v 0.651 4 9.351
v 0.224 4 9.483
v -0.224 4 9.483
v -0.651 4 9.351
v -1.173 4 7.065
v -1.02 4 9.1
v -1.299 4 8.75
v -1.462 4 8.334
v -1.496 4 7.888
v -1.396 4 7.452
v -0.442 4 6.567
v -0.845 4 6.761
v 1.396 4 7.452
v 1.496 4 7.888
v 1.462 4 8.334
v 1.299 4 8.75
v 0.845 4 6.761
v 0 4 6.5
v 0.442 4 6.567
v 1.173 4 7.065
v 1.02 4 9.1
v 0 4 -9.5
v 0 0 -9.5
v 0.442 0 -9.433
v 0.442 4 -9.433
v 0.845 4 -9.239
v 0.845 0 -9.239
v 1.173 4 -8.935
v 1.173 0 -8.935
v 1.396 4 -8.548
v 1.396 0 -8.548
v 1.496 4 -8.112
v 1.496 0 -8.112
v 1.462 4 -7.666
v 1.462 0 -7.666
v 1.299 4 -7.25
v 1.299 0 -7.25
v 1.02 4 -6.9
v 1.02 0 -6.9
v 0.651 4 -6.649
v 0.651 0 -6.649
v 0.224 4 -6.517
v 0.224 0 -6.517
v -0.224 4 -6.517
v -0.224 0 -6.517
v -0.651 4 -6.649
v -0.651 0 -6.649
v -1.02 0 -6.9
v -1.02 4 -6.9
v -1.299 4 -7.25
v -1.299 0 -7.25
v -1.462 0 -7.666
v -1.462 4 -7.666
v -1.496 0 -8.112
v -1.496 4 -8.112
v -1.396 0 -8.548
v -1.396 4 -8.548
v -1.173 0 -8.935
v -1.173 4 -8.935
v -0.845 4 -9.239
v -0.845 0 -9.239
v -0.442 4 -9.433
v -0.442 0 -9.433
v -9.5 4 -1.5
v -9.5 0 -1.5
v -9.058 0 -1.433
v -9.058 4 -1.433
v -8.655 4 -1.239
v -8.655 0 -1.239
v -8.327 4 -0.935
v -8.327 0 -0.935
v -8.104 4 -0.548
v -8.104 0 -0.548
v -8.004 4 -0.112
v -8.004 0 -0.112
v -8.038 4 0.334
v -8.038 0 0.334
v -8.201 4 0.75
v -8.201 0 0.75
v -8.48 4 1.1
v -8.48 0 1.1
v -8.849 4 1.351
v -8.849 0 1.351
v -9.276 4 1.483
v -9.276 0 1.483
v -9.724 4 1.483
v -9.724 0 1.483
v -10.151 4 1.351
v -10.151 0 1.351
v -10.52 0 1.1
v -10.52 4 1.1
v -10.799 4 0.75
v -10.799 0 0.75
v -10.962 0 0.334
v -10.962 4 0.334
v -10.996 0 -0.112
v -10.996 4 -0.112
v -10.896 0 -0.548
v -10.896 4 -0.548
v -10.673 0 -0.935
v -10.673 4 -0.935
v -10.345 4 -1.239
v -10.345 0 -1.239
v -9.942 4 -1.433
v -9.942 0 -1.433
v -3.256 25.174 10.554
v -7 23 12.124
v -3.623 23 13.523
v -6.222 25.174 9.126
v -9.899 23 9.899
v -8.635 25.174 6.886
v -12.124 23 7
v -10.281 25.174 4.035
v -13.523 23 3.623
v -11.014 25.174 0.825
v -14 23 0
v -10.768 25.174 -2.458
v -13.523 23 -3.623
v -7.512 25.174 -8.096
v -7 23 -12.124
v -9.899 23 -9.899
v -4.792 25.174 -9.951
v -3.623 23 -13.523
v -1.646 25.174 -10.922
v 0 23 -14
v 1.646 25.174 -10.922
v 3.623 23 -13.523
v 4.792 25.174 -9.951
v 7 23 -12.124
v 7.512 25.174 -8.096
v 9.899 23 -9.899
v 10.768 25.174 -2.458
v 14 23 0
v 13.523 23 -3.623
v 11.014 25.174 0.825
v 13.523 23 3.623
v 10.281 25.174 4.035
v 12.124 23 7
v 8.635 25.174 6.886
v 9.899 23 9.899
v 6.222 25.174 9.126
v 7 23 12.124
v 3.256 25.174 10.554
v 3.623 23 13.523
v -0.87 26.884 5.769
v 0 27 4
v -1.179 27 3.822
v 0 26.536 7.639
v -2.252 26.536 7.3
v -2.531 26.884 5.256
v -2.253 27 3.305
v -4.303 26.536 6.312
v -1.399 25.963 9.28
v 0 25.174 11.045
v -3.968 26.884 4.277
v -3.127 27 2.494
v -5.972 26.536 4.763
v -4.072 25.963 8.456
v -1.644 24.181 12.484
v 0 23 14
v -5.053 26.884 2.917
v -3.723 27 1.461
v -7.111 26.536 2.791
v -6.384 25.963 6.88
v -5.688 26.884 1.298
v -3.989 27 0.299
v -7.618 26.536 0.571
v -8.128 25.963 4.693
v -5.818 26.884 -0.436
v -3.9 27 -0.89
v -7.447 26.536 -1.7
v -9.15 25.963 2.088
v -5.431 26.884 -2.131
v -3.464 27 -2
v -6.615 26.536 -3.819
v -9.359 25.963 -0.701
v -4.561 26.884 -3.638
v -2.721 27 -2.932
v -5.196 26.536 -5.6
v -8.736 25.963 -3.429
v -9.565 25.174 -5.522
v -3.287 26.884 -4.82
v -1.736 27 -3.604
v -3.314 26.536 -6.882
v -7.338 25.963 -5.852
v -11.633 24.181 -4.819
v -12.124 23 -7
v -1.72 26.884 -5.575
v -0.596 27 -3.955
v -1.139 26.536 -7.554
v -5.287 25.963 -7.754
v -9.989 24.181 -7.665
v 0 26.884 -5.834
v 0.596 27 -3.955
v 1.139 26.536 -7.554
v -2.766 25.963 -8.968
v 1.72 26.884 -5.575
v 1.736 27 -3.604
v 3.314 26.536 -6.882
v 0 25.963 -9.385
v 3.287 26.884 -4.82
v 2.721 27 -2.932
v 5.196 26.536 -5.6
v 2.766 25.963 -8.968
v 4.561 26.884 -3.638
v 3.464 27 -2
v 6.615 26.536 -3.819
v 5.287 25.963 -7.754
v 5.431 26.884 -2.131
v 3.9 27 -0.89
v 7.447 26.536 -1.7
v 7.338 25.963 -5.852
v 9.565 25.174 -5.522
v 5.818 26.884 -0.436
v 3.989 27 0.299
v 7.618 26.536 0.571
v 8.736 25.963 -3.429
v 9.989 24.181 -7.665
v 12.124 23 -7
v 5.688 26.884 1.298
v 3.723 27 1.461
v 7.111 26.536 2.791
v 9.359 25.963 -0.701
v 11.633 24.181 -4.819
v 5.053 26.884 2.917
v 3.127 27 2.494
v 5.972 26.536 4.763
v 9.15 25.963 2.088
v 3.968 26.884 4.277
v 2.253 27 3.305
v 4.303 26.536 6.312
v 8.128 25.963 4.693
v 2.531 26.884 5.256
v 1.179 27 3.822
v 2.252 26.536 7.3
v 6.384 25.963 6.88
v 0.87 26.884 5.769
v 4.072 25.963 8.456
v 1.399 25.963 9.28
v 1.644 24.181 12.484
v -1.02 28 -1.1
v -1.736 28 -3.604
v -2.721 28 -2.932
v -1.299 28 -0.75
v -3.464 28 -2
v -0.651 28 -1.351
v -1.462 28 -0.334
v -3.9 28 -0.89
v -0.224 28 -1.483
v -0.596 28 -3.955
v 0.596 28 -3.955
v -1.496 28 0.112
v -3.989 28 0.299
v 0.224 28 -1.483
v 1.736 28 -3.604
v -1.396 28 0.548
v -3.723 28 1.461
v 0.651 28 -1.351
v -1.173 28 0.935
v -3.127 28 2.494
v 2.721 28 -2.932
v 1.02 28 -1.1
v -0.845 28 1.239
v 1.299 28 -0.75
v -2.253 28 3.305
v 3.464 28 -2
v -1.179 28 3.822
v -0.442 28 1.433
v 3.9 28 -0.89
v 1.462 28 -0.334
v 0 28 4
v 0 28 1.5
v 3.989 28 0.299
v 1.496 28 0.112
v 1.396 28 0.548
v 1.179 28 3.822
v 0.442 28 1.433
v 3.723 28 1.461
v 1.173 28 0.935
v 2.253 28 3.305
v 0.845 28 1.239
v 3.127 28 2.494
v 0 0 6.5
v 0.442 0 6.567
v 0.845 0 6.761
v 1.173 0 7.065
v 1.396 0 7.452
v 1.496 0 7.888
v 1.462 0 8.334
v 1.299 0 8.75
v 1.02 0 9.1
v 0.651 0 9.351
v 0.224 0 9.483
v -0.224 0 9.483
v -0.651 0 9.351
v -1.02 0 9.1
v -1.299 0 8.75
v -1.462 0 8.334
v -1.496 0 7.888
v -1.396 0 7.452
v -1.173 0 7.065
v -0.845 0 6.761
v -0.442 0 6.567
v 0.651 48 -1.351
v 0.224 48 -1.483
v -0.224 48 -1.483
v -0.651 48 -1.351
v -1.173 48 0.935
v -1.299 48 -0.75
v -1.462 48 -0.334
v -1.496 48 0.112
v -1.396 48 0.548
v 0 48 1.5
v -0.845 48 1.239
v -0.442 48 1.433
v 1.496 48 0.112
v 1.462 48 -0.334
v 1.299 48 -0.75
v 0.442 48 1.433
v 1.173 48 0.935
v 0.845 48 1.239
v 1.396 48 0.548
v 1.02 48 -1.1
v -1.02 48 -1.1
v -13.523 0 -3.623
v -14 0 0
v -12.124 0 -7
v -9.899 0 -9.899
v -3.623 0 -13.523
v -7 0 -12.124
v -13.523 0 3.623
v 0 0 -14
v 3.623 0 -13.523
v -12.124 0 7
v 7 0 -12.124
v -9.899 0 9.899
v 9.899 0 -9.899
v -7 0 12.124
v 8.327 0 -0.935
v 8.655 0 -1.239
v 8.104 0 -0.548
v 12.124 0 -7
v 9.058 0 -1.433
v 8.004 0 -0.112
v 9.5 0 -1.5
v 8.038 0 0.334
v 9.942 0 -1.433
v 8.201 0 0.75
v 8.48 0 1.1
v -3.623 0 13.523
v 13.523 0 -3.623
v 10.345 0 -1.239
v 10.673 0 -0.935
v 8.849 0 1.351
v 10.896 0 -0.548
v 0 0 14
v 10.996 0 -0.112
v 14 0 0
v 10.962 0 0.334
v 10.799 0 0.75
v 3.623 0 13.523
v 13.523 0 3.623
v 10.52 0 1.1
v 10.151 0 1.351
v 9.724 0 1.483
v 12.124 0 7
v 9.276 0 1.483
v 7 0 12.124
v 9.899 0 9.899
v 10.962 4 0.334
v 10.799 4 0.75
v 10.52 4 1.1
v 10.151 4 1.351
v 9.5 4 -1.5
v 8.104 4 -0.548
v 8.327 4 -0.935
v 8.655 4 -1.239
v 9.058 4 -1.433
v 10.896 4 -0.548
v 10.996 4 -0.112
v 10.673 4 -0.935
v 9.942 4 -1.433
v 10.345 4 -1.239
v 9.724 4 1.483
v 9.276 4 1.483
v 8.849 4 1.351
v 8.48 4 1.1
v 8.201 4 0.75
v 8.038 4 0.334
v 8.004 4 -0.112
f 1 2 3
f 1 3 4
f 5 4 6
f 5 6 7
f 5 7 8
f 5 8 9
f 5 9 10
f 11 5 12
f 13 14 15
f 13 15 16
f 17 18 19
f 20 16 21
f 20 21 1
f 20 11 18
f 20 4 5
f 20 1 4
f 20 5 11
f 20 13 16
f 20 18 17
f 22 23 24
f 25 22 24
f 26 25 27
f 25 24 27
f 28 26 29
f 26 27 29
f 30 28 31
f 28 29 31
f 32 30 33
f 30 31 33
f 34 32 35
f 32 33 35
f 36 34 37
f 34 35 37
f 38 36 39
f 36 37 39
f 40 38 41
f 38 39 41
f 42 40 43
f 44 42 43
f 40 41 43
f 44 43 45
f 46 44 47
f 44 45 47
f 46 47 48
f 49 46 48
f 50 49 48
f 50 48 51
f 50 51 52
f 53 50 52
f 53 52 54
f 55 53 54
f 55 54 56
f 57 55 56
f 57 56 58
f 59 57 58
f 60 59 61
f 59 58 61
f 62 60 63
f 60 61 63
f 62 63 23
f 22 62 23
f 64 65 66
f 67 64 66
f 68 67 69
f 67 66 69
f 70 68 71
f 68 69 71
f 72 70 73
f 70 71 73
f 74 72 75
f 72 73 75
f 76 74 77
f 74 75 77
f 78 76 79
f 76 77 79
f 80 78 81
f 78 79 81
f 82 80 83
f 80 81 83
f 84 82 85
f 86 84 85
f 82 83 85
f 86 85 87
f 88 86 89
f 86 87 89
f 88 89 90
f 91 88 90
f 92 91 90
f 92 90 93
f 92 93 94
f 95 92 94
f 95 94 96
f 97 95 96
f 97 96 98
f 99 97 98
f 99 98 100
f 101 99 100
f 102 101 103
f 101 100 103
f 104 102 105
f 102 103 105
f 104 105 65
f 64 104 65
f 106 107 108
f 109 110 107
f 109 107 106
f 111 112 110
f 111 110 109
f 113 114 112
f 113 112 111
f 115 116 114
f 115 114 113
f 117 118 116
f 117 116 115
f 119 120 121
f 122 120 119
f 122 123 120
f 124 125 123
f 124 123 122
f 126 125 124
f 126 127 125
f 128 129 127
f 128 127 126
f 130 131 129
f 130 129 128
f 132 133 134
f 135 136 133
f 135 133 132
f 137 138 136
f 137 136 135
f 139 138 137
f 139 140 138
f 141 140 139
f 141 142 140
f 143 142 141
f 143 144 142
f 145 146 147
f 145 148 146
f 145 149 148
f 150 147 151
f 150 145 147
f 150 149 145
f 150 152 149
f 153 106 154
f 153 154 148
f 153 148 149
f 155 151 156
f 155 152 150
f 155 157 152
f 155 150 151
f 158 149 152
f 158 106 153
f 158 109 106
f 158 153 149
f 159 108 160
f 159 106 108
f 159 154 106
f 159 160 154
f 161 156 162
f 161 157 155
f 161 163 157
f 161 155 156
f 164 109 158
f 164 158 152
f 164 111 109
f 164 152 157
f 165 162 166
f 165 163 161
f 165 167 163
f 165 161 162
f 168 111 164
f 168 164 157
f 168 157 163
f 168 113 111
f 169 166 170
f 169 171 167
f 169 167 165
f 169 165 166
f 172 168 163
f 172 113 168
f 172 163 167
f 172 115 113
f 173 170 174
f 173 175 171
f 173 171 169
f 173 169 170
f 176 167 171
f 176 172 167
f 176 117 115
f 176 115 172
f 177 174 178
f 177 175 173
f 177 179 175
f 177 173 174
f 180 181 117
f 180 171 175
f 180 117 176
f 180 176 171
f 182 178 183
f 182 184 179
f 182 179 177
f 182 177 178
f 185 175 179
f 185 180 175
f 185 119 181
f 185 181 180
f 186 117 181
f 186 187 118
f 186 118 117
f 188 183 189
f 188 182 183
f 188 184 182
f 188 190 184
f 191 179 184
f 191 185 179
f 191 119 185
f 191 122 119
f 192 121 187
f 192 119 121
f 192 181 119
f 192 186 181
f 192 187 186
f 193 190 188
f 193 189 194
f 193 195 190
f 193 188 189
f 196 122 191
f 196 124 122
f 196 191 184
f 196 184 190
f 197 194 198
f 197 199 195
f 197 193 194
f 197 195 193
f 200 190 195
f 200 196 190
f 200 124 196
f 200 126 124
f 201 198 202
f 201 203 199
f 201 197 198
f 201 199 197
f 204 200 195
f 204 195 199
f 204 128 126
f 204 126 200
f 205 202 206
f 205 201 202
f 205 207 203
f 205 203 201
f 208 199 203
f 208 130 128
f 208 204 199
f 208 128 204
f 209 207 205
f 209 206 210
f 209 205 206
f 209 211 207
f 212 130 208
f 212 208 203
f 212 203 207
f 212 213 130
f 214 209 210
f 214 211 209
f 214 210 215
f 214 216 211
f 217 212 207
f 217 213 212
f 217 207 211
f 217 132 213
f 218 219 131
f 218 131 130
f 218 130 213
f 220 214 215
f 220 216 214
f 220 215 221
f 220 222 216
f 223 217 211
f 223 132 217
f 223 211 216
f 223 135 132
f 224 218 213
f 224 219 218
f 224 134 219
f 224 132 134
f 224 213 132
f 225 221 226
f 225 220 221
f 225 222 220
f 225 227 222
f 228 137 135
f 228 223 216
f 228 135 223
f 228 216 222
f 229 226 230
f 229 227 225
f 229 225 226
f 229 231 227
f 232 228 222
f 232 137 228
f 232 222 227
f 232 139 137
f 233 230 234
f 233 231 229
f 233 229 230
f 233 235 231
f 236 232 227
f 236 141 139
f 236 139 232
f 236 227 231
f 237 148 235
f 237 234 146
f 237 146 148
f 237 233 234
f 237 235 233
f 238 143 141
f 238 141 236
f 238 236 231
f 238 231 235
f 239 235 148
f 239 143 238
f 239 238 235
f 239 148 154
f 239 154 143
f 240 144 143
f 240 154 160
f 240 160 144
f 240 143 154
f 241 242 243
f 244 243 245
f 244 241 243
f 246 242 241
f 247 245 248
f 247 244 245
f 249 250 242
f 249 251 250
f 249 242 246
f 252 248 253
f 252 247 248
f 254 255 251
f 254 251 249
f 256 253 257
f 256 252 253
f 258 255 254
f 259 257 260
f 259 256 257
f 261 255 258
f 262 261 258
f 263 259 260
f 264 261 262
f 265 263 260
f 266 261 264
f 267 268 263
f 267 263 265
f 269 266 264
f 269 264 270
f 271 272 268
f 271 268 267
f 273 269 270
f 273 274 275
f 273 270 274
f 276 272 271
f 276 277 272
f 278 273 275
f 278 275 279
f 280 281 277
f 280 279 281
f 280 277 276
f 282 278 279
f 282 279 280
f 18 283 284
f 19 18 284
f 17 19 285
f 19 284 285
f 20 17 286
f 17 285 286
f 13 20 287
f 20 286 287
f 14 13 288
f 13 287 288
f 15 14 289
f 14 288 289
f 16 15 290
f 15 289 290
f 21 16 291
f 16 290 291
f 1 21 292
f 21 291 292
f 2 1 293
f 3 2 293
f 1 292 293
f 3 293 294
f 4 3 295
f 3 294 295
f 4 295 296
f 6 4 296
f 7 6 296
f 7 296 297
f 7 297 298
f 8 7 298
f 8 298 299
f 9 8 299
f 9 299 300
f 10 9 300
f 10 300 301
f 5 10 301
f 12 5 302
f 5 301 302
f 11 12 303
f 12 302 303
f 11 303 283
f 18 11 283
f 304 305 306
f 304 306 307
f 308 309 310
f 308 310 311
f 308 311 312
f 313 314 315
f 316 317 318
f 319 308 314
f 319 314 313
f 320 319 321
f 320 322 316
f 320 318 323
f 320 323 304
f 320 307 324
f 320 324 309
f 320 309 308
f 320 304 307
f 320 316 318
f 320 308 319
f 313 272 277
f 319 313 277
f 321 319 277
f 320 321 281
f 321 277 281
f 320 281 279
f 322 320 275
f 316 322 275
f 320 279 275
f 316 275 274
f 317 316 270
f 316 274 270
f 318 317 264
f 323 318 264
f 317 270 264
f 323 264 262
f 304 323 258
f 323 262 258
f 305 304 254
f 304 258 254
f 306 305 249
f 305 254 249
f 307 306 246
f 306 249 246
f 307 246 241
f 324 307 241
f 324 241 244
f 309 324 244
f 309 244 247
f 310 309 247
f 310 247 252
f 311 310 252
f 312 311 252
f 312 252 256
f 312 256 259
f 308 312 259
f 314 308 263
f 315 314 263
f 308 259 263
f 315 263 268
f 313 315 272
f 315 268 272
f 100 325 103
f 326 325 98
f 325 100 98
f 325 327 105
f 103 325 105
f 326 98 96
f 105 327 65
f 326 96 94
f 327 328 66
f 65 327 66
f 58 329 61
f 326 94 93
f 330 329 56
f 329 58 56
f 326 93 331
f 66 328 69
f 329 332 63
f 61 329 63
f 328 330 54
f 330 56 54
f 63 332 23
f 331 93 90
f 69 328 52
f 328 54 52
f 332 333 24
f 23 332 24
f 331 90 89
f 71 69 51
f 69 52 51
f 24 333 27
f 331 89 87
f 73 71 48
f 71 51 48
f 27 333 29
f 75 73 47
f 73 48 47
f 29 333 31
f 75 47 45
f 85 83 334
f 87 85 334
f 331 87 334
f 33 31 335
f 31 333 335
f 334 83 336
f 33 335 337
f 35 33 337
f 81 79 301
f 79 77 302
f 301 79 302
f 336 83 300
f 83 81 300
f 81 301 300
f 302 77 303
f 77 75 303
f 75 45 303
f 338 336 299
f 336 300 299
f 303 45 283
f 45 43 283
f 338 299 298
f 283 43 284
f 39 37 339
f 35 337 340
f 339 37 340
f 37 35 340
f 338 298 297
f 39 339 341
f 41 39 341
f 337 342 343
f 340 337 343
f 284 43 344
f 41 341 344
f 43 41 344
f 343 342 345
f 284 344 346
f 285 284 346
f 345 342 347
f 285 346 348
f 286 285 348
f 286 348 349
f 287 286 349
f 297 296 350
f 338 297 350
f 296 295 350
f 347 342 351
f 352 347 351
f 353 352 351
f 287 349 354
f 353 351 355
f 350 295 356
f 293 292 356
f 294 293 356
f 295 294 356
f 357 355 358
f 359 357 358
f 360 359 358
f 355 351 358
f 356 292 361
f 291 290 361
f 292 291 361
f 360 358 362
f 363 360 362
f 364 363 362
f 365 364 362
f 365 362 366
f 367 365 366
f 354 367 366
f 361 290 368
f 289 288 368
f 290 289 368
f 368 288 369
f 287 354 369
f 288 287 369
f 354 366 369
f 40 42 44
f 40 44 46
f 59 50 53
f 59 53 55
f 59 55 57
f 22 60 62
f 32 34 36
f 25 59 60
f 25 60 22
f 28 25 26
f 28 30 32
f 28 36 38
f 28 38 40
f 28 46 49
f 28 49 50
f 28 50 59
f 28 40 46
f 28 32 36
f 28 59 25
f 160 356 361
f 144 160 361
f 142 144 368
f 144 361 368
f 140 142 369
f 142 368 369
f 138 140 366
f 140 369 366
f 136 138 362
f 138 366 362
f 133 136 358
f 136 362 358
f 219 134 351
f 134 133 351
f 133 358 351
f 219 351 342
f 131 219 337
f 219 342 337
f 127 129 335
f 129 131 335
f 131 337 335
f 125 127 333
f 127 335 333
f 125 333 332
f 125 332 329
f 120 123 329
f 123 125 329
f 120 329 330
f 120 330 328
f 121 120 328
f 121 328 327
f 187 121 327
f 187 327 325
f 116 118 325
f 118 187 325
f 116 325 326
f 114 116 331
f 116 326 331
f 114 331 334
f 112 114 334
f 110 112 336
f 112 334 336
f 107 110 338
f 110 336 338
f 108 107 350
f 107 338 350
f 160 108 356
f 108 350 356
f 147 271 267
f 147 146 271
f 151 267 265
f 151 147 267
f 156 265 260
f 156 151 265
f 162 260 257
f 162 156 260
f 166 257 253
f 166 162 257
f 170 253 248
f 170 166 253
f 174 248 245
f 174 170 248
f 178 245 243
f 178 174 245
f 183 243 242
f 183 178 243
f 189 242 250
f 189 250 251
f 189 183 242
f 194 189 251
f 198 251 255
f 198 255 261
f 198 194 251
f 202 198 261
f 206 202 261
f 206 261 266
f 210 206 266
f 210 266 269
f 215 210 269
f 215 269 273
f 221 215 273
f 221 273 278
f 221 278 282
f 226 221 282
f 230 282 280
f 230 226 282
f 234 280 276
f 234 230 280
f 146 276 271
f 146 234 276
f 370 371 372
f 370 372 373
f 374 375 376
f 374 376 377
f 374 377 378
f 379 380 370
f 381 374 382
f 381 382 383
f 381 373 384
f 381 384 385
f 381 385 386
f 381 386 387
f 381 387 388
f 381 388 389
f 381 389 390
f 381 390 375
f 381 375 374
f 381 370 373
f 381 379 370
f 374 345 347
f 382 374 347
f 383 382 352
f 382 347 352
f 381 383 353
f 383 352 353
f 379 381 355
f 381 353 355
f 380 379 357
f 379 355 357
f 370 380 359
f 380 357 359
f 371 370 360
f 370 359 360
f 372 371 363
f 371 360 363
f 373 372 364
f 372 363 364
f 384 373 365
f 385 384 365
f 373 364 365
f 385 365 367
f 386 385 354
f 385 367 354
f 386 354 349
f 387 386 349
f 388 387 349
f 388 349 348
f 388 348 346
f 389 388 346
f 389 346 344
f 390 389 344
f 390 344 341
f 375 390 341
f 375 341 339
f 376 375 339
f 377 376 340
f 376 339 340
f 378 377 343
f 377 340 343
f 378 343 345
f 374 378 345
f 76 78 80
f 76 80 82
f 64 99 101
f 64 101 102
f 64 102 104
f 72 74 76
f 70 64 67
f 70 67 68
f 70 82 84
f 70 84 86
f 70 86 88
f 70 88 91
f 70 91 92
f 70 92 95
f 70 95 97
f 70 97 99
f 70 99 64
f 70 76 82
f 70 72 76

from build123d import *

# Parameters (mm, degrees)
SKETCH1_R           = 14
BOSS_EXTRUDE1_DEPTH = 28
SKETCH2_R           = 1.5
CUT_EXTRUDE1_DEPTH  = 4
SKETCH5_R           = 1.5
BOSS_EXTRUDE2_DEPTH = 20


with BuildPart() as part:
    # Sketch1 → Boss-Extrude1 (new body)
    with BuildSketch(Plane(origin=(0, 0, 0), x_dir=(1, 0, 0), z_dir=(0, 1, 0))):
        with Locations(Location((0, 0, 0), (0, 0, 270))):
            Circle(SKETCH1_R)
    extrude(amount=BOSS_EXTRUDE1_DEPTH)

    # Sketch2 → Cut-Extrude1 (cut)
    with BuildSketch(Plane.XZ):
        with Locations(Location((0, 8, 0), (0, 0, 270))):
            Circle(SKETCH2_R)
        with Locations(Location((9.5, 0, 0), (0, 0, 270))):
            Circle(SKETCH2_R)
        with Locations(Location((0, -8, 0), (0, 0, 270))):
            Circle(SKETCH2_R)
        with Locations(Location((-9.5, 0, 0), (0, 0, 270))):
            Circle(SKETCH2_R)
    extrude(amount=-CUT_EXTRUDE1_DEPTH, mode=Mode.SUBTRACT)

    # Sketch4 → Cut-Revolve1 (revolve, cut)
    with BuildSketch(Plane.XY, mode=Mode.PRIVATE) as cut_revolve1_sk:
        with BuildLine():
            Line((-14, 23), (-14, 28))
            Line((-14, 28), (-4, 28))
            Line((-4, 28), (-4, 27))
            ThreePointArc((-4, 27), (-9.385164807, 25.962912018), (-14, 23))
        make_face()
    revolve(cut_revolve1_sk.sketch.rotate(Axis((0, 28, 0), (0, -1, 0)), 270), axis=Axis((0, 28, 0), (0, -1, 0)), mode=Mode.SUBTRACT)

    # Sketch5 → Boss-Extrude2 (add)
    with BuildSketch(Plane(origin=(0, 28, 0), x_dir=(1, 0, 0), z_dir=(0, 1, 0))):
        with Locations(Location((0, 0, 0), (0, 0, 270))):
            Circle(SKETCH5_R)
    extrude(amount=BOSS_EXTRUDE2_DEPTH)


solid = part.part
